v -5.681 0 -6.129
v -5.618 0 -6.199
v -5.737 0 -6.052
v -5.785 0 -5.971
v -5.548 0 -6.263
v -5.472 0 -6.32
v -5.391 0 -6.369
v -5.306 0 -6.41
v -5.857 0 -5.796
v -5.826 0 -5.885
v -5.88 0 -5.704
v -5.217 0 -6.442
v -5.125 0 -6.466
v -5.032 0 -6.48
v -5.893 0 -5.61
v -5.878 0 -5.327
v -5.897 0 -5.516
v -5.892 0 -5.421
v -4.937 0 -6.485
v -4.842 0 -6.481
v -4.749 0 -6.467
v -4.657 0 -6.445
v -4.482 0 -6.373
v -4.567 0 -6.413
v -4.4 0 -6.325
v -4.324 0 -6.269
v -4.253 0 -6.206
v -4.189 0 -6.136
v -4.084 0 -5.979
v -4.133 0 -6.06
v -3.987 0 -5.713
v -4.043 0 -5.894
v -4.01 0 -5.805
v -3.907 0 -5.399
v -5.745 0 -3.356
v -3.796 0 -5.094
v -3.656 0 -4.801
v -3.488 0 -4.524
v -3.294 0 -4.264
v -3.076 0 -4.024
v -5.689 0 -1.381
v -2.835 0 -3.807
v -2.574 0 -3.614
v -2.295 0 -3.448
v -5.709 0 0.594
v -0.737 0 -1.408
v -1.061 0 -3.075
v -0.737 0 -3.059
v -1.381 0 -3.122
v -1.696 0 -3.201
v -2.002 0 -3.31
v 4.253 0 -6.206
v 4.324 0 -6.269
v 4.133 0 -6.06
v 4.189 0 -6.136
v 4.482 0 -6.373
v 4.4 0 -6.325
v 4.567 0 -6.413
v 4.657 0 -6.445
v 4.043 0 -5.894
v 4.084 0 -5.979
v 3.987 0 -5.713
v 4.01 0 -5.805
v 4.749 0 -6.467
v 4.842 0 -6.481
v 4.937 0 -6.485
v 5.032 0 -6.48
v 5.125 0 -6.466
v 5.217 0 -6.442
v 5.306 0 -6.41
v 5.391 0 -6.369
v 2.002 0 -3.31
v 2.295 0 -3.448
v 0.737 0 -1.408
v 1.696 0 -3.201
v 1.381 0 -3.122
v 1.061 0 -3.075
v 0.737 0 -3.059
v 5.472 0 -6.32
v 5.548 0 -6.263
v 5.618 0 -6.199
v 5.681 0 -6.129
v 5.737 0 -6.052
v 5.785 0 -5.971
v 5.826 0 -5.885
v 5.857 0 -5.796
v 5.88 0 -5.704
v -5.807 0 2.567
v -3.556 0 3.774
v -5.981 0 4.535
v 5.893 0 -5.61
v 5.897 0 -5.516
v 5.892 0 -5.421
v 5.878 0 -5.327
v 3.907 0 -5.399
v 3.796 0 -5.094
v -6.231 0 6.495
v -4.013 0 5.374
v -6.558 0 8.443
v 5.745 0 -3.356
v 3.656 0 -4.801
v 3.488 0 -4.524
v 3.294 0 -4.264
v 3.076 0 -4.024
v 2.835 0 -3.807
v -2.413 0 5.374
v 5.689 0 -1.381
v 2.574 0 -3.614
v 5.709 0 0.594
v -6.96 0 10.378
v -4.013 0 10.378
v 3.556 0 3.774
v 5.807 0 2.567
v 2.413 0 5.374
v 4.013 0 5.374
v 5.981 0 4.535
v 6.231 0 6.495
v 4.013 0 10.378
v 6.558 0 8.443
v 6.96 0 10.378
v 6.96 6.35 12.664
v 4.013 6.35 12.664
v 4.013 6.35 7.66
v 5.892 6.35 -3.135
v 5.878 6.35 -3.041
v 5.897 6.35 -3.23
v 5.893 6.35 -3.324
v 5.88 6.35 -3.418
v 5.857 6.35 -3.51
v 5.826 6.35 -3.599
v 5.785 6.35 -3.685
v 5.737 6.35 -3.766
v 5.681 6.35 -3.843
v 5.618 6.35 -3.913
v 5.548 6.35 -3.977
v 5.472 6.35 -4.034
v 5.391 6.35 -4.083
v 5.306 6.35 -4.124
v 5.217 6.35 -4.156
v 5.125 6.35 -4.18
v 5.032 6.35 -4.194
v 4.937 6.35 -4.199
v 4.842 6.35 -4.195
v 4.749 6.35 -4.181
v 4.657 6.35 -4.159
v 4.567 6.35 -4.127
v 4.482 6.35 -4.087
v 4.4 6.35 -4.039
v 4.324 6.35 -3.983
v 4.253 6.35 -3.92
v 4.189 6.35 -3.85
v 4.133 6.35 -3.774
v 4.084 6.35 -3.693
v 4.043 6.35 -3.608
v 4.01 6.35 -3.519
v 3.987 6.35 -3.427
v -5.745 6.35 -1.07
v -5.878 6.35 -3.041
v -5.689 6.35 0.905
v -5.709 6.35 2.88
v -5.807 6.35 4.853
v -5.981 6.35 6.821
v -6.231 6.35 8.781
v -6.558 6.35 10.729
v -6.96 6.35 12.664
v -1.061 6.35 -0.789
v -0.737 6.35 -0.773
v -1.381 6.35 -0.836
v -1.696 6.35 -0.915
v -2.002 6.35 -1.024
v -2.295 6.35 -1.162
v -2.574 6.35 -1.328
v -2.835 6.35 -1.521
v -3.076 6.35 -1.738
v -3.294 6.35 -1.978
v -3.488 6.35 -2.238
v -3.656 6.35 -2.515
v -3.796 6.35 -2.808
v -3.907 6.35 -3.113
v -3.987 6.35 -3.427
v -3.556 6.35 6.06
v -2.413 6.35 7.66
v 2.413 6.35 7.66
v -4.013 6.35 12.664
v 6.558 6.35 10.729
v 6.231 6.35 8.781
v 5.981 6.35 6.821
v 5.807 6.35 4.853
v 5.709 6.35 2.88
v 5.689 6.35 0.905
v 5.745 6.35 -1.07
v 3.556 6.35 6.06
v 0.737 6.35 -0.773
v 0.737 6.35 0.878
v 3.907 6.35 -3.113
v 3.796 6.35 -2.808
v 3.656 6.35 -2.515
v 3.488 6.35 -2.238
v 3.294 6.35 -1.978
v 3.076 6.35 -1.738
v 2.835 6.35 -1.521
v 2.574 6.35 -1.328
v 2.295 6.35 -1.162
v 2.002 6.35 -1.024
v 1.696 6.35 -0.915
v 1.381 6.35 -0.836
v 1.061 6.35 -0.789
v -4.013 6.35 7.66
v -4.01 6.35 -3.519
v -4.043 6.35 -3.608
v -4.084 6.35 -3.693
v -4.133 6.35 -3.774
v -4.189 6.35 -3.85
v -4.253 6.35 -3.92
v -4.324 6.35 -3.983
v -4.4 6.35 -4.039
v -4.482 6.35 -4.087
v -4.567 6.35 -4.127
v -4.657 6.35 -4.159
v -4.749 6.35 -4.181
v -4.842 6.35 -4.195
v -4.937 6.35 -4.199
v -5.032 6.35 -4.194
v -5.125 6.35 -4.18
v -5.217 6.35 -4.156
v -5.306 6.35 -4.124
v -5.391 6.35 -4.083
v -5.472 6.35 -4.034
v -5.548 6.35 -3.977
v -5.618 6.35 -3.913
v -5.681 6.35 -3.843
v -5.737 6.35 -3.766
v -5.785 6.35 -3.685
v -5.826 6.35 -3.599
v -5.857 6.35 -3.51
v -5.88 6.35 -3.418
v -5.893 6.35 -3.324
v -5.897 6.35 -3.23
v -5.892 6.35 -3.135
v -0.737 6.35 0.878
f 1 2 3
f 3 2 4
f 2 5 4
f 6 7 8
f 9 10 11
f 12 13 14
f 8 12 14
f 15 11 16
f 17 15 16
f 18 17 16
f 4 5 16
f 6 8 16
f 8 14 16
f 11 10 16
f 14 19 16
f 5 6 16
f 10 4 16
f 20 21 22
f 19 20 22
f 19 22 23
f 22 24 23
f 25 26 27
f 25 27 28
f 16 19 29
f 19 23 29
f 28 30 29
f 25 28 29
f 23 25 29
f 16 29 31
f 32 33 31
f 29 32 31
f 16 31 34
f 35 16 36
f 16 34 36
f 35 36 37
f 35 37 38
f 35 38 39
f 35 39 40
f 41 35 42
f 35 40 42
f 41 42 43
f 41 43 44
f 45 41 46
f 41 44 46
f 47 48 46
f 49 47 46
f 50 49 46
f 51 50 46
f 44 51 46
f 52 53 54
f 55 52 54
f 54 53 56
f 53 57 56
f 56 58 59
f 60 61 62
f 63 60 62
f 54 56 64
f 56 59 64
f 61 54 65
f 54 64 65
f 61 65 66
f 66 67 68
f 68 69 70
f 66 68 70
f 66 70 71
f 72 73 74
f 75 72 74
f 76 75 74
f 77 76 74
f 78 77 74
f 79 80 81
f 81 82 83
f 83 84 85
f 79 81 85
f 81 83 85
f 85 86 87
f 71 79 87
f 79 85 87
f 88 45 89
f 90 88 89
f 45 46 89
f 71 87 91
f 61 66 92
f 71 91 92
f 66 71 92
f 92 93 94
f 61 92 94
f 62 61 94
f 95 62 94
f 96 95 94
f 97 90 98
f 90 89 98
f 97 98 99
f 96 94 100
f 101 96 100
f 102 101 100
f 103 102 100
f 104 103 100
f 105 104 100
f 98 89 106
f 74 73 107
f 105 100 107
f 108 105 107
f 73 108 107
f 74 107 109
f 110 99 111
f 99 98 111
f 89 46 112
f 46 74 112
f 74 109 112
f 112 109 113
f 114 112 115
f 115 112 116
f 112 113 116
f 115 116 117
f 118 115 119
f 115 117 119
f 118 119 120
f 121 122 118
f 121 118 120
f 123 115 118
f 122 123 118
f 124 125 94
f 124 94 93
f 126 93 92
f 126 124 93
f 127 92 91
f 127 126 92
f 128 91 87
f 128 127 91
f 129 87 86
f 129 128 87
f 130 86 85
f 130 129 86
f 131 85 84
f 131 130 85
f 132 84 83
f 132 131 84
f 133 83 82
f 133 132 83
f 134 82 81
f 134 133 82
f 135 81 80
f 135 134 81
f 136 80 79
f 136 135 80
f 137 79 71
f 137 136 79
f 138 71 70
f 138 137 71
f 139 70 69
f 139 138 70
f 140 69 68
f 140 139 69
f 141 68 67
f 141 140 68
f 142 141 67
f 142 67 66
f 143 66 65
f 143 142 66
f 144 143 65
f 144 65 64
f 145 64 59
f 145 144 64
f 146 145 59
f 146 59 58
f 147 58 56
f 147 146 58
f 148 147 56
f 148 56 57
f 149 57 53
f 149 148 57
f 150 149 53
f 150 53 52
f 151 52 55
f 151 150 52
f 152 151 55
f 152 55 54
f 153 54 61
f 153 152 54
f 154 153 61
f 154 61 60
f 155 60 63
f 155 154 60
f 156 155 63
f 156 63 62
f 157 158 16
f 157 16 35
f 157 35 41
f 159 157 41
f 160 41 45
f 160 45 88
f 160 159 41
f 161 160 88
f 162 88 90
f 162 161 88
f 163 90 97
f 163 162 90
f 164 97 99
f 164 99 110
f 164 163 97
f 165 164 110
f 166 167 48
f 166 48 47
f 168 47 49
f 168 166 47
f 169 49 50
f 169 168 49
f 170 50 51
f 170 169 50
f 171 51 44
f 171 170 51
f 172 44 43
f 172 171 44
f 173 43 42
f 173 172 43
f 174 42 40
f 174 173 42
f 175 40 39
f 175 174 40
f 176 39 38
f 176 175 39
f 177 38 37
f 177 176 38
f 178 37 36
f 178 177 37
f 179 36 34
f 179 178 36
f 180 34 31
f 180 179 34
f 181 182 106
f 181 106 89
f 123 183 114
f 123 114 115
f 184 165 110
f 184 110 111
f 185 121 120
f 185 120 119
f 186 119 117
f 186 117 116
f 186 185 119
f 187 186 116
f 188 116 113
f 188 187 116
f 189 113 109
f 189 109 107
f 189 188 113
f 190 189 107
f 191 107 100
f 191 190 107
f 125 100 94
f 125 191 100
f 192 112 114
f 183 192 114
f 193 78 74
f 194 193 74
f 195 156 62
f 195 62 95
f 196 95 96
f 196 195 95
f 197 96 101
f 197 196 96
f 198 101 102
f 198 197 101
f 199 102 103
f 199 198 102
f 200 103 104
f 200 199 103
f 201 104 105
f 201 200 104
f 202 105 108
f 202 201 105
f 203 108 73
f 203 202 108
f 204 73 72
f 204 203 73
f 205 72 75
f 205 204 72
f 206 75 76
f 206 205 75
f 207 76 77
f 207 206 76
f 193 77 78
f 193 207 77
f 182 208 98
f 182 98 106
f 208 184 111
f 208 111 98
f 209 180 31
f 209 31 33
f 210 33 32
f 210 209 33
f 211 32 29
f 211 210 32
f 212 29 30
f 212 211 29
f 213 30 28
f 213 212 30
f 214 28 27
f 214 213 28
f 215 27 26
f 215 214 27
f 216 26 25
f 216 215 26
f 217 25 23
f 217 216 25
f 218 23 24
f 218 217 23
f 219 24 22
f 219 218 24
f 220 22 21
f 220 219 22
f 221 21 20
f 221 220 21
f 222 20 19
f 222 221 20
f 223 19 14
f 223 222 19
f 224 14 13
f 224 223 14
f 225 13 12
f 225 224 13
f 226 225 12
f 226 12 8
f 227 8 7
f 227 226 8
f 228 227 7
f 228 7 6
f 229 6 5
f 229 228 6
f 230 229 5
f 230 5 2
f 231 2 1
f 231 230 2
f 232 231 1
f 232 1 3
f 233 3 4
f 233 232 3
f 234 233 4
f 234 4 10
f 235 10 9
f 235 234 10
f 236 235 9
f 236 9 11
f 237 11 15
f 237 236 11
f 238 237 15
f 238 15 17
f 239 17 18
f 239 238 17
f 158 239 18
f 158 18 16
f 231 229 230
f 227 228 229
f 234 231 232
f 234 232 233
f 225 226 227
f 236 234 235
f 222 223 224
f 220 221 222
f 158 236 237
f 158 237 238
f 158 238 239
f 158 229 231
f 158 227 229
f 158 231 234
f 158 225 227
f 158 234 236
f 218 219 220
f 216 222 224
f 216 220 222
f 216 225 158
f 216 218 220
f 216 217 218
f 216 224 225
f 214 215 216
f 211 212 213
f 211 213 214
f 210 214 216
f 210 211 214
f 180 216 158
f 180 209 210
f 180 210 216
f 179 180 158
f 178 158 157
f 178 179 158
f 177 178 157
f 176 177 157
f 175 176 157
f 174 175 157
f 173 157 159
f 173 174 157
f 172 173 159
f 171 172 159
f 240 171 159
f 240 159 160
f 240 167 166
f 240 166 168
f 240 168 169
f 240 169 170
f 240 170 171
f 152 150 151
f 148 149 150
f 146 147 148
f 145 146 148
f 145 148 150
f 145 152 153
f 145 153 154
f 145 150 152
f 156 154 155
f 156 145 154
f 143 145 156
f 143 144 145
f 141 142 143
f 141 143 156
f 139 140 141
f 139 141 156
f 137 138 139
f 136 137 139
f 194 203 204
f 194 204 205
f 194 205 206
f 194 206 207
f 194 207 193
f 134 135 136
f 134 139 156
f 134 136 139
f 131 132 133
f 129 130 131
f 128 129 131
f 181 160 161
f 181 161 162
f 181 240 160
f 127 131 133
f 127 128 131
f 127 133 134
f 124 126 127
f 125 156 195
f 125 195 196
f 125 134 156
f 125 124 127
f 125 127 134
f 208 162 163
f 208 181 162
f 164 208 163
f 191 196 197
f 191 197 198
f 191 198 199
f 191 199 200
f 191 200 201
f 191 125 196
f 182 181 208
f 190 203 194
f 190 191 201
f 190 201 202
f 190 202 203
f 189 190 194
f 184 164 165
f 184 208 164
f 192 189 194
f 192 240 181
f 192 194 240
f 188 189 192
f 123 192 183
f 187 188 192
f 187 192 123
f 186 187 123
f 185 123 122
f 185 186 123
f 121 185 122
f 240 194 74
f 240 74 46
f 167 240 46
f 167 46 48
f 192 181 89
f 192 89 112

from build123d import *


with BuildPart() as part:
    # Sweep1: sweep along a path in Sketch4
    with BuildLine(Plane(origin=(0, 0, 0), x_dir=(0, 0, -1), z_dir=(1, 0, 0))) as sweep1_path:
        Line((0, 0), (-2.286, 6.35))
    # Sketch2 → Sweep1 (sweep)
    with BuildSketch(Plane(origin=(0, 0, 0), x_dir=(1, 0, 0), z_dir=(0, 1, 0))):
        with BuildLine():
            Line((6.9596, -10.377746103), (4.0132, -10.377746103))
            Line((4.0132, -10.377746103), (4.0132, -5.373946103))
            Line((4.0132, -5.373946103), (2.413, -5.373946103))
            Line((2.413, -5.373946103), (3.556, -3.773746103))
            Line((3.556, -3.773746103), (-3.556, -3.773746103))
            Line((-3.556, -3.773746103), (-2.413, -5.373946103))
            Line((-2.413, -5.373946103), (-4.0132, -5.373946103))
            Line((-4.0132, -5.373946103), (-4.0132, -10.377746103))
            Line((-4.0132, -10.377746103), (-6.9596, -10.377746103))
            ThreePointArc((-6.9596, -10.377746103), (-5.806615649, -2.567356115), (-5.877729648, 5.327357779))
            ThreePointArc((-5.877729648, 5.327357779), (-5.125150102, 6.465638091), (-3.98686979, 5.713058545))
            ThreePointArc((-3.98686979, 5.713058545), (-2.834757288, 3.806705335), (-0.7366, 3.058853897))
            Line((-0.7366, 3.058853897), (-0.7366, 1.407853897))
            Line((-0.7366, 1.407853897), (0.7366, 1.407853897))
            Line((0.7366, 1.407853897), (0.7366, 3.058853897))
            ThreePointArc((0.7366, 3.058853897), (2.834757288, 3.806705335), (3.98686979, 5.713058545))
            ThreePointArc((3.98686979, 5.713058545), (5.125150102, 6.465638091), (5.877729648, 5.327357779))
            ThreePointArc((5.877729648, 5.327357779), (5.806615649, -2.567356115), (6.9596, -10.377746103))
        make_face()
    sweep(path=sweep1_path.line)


solid = part.part
